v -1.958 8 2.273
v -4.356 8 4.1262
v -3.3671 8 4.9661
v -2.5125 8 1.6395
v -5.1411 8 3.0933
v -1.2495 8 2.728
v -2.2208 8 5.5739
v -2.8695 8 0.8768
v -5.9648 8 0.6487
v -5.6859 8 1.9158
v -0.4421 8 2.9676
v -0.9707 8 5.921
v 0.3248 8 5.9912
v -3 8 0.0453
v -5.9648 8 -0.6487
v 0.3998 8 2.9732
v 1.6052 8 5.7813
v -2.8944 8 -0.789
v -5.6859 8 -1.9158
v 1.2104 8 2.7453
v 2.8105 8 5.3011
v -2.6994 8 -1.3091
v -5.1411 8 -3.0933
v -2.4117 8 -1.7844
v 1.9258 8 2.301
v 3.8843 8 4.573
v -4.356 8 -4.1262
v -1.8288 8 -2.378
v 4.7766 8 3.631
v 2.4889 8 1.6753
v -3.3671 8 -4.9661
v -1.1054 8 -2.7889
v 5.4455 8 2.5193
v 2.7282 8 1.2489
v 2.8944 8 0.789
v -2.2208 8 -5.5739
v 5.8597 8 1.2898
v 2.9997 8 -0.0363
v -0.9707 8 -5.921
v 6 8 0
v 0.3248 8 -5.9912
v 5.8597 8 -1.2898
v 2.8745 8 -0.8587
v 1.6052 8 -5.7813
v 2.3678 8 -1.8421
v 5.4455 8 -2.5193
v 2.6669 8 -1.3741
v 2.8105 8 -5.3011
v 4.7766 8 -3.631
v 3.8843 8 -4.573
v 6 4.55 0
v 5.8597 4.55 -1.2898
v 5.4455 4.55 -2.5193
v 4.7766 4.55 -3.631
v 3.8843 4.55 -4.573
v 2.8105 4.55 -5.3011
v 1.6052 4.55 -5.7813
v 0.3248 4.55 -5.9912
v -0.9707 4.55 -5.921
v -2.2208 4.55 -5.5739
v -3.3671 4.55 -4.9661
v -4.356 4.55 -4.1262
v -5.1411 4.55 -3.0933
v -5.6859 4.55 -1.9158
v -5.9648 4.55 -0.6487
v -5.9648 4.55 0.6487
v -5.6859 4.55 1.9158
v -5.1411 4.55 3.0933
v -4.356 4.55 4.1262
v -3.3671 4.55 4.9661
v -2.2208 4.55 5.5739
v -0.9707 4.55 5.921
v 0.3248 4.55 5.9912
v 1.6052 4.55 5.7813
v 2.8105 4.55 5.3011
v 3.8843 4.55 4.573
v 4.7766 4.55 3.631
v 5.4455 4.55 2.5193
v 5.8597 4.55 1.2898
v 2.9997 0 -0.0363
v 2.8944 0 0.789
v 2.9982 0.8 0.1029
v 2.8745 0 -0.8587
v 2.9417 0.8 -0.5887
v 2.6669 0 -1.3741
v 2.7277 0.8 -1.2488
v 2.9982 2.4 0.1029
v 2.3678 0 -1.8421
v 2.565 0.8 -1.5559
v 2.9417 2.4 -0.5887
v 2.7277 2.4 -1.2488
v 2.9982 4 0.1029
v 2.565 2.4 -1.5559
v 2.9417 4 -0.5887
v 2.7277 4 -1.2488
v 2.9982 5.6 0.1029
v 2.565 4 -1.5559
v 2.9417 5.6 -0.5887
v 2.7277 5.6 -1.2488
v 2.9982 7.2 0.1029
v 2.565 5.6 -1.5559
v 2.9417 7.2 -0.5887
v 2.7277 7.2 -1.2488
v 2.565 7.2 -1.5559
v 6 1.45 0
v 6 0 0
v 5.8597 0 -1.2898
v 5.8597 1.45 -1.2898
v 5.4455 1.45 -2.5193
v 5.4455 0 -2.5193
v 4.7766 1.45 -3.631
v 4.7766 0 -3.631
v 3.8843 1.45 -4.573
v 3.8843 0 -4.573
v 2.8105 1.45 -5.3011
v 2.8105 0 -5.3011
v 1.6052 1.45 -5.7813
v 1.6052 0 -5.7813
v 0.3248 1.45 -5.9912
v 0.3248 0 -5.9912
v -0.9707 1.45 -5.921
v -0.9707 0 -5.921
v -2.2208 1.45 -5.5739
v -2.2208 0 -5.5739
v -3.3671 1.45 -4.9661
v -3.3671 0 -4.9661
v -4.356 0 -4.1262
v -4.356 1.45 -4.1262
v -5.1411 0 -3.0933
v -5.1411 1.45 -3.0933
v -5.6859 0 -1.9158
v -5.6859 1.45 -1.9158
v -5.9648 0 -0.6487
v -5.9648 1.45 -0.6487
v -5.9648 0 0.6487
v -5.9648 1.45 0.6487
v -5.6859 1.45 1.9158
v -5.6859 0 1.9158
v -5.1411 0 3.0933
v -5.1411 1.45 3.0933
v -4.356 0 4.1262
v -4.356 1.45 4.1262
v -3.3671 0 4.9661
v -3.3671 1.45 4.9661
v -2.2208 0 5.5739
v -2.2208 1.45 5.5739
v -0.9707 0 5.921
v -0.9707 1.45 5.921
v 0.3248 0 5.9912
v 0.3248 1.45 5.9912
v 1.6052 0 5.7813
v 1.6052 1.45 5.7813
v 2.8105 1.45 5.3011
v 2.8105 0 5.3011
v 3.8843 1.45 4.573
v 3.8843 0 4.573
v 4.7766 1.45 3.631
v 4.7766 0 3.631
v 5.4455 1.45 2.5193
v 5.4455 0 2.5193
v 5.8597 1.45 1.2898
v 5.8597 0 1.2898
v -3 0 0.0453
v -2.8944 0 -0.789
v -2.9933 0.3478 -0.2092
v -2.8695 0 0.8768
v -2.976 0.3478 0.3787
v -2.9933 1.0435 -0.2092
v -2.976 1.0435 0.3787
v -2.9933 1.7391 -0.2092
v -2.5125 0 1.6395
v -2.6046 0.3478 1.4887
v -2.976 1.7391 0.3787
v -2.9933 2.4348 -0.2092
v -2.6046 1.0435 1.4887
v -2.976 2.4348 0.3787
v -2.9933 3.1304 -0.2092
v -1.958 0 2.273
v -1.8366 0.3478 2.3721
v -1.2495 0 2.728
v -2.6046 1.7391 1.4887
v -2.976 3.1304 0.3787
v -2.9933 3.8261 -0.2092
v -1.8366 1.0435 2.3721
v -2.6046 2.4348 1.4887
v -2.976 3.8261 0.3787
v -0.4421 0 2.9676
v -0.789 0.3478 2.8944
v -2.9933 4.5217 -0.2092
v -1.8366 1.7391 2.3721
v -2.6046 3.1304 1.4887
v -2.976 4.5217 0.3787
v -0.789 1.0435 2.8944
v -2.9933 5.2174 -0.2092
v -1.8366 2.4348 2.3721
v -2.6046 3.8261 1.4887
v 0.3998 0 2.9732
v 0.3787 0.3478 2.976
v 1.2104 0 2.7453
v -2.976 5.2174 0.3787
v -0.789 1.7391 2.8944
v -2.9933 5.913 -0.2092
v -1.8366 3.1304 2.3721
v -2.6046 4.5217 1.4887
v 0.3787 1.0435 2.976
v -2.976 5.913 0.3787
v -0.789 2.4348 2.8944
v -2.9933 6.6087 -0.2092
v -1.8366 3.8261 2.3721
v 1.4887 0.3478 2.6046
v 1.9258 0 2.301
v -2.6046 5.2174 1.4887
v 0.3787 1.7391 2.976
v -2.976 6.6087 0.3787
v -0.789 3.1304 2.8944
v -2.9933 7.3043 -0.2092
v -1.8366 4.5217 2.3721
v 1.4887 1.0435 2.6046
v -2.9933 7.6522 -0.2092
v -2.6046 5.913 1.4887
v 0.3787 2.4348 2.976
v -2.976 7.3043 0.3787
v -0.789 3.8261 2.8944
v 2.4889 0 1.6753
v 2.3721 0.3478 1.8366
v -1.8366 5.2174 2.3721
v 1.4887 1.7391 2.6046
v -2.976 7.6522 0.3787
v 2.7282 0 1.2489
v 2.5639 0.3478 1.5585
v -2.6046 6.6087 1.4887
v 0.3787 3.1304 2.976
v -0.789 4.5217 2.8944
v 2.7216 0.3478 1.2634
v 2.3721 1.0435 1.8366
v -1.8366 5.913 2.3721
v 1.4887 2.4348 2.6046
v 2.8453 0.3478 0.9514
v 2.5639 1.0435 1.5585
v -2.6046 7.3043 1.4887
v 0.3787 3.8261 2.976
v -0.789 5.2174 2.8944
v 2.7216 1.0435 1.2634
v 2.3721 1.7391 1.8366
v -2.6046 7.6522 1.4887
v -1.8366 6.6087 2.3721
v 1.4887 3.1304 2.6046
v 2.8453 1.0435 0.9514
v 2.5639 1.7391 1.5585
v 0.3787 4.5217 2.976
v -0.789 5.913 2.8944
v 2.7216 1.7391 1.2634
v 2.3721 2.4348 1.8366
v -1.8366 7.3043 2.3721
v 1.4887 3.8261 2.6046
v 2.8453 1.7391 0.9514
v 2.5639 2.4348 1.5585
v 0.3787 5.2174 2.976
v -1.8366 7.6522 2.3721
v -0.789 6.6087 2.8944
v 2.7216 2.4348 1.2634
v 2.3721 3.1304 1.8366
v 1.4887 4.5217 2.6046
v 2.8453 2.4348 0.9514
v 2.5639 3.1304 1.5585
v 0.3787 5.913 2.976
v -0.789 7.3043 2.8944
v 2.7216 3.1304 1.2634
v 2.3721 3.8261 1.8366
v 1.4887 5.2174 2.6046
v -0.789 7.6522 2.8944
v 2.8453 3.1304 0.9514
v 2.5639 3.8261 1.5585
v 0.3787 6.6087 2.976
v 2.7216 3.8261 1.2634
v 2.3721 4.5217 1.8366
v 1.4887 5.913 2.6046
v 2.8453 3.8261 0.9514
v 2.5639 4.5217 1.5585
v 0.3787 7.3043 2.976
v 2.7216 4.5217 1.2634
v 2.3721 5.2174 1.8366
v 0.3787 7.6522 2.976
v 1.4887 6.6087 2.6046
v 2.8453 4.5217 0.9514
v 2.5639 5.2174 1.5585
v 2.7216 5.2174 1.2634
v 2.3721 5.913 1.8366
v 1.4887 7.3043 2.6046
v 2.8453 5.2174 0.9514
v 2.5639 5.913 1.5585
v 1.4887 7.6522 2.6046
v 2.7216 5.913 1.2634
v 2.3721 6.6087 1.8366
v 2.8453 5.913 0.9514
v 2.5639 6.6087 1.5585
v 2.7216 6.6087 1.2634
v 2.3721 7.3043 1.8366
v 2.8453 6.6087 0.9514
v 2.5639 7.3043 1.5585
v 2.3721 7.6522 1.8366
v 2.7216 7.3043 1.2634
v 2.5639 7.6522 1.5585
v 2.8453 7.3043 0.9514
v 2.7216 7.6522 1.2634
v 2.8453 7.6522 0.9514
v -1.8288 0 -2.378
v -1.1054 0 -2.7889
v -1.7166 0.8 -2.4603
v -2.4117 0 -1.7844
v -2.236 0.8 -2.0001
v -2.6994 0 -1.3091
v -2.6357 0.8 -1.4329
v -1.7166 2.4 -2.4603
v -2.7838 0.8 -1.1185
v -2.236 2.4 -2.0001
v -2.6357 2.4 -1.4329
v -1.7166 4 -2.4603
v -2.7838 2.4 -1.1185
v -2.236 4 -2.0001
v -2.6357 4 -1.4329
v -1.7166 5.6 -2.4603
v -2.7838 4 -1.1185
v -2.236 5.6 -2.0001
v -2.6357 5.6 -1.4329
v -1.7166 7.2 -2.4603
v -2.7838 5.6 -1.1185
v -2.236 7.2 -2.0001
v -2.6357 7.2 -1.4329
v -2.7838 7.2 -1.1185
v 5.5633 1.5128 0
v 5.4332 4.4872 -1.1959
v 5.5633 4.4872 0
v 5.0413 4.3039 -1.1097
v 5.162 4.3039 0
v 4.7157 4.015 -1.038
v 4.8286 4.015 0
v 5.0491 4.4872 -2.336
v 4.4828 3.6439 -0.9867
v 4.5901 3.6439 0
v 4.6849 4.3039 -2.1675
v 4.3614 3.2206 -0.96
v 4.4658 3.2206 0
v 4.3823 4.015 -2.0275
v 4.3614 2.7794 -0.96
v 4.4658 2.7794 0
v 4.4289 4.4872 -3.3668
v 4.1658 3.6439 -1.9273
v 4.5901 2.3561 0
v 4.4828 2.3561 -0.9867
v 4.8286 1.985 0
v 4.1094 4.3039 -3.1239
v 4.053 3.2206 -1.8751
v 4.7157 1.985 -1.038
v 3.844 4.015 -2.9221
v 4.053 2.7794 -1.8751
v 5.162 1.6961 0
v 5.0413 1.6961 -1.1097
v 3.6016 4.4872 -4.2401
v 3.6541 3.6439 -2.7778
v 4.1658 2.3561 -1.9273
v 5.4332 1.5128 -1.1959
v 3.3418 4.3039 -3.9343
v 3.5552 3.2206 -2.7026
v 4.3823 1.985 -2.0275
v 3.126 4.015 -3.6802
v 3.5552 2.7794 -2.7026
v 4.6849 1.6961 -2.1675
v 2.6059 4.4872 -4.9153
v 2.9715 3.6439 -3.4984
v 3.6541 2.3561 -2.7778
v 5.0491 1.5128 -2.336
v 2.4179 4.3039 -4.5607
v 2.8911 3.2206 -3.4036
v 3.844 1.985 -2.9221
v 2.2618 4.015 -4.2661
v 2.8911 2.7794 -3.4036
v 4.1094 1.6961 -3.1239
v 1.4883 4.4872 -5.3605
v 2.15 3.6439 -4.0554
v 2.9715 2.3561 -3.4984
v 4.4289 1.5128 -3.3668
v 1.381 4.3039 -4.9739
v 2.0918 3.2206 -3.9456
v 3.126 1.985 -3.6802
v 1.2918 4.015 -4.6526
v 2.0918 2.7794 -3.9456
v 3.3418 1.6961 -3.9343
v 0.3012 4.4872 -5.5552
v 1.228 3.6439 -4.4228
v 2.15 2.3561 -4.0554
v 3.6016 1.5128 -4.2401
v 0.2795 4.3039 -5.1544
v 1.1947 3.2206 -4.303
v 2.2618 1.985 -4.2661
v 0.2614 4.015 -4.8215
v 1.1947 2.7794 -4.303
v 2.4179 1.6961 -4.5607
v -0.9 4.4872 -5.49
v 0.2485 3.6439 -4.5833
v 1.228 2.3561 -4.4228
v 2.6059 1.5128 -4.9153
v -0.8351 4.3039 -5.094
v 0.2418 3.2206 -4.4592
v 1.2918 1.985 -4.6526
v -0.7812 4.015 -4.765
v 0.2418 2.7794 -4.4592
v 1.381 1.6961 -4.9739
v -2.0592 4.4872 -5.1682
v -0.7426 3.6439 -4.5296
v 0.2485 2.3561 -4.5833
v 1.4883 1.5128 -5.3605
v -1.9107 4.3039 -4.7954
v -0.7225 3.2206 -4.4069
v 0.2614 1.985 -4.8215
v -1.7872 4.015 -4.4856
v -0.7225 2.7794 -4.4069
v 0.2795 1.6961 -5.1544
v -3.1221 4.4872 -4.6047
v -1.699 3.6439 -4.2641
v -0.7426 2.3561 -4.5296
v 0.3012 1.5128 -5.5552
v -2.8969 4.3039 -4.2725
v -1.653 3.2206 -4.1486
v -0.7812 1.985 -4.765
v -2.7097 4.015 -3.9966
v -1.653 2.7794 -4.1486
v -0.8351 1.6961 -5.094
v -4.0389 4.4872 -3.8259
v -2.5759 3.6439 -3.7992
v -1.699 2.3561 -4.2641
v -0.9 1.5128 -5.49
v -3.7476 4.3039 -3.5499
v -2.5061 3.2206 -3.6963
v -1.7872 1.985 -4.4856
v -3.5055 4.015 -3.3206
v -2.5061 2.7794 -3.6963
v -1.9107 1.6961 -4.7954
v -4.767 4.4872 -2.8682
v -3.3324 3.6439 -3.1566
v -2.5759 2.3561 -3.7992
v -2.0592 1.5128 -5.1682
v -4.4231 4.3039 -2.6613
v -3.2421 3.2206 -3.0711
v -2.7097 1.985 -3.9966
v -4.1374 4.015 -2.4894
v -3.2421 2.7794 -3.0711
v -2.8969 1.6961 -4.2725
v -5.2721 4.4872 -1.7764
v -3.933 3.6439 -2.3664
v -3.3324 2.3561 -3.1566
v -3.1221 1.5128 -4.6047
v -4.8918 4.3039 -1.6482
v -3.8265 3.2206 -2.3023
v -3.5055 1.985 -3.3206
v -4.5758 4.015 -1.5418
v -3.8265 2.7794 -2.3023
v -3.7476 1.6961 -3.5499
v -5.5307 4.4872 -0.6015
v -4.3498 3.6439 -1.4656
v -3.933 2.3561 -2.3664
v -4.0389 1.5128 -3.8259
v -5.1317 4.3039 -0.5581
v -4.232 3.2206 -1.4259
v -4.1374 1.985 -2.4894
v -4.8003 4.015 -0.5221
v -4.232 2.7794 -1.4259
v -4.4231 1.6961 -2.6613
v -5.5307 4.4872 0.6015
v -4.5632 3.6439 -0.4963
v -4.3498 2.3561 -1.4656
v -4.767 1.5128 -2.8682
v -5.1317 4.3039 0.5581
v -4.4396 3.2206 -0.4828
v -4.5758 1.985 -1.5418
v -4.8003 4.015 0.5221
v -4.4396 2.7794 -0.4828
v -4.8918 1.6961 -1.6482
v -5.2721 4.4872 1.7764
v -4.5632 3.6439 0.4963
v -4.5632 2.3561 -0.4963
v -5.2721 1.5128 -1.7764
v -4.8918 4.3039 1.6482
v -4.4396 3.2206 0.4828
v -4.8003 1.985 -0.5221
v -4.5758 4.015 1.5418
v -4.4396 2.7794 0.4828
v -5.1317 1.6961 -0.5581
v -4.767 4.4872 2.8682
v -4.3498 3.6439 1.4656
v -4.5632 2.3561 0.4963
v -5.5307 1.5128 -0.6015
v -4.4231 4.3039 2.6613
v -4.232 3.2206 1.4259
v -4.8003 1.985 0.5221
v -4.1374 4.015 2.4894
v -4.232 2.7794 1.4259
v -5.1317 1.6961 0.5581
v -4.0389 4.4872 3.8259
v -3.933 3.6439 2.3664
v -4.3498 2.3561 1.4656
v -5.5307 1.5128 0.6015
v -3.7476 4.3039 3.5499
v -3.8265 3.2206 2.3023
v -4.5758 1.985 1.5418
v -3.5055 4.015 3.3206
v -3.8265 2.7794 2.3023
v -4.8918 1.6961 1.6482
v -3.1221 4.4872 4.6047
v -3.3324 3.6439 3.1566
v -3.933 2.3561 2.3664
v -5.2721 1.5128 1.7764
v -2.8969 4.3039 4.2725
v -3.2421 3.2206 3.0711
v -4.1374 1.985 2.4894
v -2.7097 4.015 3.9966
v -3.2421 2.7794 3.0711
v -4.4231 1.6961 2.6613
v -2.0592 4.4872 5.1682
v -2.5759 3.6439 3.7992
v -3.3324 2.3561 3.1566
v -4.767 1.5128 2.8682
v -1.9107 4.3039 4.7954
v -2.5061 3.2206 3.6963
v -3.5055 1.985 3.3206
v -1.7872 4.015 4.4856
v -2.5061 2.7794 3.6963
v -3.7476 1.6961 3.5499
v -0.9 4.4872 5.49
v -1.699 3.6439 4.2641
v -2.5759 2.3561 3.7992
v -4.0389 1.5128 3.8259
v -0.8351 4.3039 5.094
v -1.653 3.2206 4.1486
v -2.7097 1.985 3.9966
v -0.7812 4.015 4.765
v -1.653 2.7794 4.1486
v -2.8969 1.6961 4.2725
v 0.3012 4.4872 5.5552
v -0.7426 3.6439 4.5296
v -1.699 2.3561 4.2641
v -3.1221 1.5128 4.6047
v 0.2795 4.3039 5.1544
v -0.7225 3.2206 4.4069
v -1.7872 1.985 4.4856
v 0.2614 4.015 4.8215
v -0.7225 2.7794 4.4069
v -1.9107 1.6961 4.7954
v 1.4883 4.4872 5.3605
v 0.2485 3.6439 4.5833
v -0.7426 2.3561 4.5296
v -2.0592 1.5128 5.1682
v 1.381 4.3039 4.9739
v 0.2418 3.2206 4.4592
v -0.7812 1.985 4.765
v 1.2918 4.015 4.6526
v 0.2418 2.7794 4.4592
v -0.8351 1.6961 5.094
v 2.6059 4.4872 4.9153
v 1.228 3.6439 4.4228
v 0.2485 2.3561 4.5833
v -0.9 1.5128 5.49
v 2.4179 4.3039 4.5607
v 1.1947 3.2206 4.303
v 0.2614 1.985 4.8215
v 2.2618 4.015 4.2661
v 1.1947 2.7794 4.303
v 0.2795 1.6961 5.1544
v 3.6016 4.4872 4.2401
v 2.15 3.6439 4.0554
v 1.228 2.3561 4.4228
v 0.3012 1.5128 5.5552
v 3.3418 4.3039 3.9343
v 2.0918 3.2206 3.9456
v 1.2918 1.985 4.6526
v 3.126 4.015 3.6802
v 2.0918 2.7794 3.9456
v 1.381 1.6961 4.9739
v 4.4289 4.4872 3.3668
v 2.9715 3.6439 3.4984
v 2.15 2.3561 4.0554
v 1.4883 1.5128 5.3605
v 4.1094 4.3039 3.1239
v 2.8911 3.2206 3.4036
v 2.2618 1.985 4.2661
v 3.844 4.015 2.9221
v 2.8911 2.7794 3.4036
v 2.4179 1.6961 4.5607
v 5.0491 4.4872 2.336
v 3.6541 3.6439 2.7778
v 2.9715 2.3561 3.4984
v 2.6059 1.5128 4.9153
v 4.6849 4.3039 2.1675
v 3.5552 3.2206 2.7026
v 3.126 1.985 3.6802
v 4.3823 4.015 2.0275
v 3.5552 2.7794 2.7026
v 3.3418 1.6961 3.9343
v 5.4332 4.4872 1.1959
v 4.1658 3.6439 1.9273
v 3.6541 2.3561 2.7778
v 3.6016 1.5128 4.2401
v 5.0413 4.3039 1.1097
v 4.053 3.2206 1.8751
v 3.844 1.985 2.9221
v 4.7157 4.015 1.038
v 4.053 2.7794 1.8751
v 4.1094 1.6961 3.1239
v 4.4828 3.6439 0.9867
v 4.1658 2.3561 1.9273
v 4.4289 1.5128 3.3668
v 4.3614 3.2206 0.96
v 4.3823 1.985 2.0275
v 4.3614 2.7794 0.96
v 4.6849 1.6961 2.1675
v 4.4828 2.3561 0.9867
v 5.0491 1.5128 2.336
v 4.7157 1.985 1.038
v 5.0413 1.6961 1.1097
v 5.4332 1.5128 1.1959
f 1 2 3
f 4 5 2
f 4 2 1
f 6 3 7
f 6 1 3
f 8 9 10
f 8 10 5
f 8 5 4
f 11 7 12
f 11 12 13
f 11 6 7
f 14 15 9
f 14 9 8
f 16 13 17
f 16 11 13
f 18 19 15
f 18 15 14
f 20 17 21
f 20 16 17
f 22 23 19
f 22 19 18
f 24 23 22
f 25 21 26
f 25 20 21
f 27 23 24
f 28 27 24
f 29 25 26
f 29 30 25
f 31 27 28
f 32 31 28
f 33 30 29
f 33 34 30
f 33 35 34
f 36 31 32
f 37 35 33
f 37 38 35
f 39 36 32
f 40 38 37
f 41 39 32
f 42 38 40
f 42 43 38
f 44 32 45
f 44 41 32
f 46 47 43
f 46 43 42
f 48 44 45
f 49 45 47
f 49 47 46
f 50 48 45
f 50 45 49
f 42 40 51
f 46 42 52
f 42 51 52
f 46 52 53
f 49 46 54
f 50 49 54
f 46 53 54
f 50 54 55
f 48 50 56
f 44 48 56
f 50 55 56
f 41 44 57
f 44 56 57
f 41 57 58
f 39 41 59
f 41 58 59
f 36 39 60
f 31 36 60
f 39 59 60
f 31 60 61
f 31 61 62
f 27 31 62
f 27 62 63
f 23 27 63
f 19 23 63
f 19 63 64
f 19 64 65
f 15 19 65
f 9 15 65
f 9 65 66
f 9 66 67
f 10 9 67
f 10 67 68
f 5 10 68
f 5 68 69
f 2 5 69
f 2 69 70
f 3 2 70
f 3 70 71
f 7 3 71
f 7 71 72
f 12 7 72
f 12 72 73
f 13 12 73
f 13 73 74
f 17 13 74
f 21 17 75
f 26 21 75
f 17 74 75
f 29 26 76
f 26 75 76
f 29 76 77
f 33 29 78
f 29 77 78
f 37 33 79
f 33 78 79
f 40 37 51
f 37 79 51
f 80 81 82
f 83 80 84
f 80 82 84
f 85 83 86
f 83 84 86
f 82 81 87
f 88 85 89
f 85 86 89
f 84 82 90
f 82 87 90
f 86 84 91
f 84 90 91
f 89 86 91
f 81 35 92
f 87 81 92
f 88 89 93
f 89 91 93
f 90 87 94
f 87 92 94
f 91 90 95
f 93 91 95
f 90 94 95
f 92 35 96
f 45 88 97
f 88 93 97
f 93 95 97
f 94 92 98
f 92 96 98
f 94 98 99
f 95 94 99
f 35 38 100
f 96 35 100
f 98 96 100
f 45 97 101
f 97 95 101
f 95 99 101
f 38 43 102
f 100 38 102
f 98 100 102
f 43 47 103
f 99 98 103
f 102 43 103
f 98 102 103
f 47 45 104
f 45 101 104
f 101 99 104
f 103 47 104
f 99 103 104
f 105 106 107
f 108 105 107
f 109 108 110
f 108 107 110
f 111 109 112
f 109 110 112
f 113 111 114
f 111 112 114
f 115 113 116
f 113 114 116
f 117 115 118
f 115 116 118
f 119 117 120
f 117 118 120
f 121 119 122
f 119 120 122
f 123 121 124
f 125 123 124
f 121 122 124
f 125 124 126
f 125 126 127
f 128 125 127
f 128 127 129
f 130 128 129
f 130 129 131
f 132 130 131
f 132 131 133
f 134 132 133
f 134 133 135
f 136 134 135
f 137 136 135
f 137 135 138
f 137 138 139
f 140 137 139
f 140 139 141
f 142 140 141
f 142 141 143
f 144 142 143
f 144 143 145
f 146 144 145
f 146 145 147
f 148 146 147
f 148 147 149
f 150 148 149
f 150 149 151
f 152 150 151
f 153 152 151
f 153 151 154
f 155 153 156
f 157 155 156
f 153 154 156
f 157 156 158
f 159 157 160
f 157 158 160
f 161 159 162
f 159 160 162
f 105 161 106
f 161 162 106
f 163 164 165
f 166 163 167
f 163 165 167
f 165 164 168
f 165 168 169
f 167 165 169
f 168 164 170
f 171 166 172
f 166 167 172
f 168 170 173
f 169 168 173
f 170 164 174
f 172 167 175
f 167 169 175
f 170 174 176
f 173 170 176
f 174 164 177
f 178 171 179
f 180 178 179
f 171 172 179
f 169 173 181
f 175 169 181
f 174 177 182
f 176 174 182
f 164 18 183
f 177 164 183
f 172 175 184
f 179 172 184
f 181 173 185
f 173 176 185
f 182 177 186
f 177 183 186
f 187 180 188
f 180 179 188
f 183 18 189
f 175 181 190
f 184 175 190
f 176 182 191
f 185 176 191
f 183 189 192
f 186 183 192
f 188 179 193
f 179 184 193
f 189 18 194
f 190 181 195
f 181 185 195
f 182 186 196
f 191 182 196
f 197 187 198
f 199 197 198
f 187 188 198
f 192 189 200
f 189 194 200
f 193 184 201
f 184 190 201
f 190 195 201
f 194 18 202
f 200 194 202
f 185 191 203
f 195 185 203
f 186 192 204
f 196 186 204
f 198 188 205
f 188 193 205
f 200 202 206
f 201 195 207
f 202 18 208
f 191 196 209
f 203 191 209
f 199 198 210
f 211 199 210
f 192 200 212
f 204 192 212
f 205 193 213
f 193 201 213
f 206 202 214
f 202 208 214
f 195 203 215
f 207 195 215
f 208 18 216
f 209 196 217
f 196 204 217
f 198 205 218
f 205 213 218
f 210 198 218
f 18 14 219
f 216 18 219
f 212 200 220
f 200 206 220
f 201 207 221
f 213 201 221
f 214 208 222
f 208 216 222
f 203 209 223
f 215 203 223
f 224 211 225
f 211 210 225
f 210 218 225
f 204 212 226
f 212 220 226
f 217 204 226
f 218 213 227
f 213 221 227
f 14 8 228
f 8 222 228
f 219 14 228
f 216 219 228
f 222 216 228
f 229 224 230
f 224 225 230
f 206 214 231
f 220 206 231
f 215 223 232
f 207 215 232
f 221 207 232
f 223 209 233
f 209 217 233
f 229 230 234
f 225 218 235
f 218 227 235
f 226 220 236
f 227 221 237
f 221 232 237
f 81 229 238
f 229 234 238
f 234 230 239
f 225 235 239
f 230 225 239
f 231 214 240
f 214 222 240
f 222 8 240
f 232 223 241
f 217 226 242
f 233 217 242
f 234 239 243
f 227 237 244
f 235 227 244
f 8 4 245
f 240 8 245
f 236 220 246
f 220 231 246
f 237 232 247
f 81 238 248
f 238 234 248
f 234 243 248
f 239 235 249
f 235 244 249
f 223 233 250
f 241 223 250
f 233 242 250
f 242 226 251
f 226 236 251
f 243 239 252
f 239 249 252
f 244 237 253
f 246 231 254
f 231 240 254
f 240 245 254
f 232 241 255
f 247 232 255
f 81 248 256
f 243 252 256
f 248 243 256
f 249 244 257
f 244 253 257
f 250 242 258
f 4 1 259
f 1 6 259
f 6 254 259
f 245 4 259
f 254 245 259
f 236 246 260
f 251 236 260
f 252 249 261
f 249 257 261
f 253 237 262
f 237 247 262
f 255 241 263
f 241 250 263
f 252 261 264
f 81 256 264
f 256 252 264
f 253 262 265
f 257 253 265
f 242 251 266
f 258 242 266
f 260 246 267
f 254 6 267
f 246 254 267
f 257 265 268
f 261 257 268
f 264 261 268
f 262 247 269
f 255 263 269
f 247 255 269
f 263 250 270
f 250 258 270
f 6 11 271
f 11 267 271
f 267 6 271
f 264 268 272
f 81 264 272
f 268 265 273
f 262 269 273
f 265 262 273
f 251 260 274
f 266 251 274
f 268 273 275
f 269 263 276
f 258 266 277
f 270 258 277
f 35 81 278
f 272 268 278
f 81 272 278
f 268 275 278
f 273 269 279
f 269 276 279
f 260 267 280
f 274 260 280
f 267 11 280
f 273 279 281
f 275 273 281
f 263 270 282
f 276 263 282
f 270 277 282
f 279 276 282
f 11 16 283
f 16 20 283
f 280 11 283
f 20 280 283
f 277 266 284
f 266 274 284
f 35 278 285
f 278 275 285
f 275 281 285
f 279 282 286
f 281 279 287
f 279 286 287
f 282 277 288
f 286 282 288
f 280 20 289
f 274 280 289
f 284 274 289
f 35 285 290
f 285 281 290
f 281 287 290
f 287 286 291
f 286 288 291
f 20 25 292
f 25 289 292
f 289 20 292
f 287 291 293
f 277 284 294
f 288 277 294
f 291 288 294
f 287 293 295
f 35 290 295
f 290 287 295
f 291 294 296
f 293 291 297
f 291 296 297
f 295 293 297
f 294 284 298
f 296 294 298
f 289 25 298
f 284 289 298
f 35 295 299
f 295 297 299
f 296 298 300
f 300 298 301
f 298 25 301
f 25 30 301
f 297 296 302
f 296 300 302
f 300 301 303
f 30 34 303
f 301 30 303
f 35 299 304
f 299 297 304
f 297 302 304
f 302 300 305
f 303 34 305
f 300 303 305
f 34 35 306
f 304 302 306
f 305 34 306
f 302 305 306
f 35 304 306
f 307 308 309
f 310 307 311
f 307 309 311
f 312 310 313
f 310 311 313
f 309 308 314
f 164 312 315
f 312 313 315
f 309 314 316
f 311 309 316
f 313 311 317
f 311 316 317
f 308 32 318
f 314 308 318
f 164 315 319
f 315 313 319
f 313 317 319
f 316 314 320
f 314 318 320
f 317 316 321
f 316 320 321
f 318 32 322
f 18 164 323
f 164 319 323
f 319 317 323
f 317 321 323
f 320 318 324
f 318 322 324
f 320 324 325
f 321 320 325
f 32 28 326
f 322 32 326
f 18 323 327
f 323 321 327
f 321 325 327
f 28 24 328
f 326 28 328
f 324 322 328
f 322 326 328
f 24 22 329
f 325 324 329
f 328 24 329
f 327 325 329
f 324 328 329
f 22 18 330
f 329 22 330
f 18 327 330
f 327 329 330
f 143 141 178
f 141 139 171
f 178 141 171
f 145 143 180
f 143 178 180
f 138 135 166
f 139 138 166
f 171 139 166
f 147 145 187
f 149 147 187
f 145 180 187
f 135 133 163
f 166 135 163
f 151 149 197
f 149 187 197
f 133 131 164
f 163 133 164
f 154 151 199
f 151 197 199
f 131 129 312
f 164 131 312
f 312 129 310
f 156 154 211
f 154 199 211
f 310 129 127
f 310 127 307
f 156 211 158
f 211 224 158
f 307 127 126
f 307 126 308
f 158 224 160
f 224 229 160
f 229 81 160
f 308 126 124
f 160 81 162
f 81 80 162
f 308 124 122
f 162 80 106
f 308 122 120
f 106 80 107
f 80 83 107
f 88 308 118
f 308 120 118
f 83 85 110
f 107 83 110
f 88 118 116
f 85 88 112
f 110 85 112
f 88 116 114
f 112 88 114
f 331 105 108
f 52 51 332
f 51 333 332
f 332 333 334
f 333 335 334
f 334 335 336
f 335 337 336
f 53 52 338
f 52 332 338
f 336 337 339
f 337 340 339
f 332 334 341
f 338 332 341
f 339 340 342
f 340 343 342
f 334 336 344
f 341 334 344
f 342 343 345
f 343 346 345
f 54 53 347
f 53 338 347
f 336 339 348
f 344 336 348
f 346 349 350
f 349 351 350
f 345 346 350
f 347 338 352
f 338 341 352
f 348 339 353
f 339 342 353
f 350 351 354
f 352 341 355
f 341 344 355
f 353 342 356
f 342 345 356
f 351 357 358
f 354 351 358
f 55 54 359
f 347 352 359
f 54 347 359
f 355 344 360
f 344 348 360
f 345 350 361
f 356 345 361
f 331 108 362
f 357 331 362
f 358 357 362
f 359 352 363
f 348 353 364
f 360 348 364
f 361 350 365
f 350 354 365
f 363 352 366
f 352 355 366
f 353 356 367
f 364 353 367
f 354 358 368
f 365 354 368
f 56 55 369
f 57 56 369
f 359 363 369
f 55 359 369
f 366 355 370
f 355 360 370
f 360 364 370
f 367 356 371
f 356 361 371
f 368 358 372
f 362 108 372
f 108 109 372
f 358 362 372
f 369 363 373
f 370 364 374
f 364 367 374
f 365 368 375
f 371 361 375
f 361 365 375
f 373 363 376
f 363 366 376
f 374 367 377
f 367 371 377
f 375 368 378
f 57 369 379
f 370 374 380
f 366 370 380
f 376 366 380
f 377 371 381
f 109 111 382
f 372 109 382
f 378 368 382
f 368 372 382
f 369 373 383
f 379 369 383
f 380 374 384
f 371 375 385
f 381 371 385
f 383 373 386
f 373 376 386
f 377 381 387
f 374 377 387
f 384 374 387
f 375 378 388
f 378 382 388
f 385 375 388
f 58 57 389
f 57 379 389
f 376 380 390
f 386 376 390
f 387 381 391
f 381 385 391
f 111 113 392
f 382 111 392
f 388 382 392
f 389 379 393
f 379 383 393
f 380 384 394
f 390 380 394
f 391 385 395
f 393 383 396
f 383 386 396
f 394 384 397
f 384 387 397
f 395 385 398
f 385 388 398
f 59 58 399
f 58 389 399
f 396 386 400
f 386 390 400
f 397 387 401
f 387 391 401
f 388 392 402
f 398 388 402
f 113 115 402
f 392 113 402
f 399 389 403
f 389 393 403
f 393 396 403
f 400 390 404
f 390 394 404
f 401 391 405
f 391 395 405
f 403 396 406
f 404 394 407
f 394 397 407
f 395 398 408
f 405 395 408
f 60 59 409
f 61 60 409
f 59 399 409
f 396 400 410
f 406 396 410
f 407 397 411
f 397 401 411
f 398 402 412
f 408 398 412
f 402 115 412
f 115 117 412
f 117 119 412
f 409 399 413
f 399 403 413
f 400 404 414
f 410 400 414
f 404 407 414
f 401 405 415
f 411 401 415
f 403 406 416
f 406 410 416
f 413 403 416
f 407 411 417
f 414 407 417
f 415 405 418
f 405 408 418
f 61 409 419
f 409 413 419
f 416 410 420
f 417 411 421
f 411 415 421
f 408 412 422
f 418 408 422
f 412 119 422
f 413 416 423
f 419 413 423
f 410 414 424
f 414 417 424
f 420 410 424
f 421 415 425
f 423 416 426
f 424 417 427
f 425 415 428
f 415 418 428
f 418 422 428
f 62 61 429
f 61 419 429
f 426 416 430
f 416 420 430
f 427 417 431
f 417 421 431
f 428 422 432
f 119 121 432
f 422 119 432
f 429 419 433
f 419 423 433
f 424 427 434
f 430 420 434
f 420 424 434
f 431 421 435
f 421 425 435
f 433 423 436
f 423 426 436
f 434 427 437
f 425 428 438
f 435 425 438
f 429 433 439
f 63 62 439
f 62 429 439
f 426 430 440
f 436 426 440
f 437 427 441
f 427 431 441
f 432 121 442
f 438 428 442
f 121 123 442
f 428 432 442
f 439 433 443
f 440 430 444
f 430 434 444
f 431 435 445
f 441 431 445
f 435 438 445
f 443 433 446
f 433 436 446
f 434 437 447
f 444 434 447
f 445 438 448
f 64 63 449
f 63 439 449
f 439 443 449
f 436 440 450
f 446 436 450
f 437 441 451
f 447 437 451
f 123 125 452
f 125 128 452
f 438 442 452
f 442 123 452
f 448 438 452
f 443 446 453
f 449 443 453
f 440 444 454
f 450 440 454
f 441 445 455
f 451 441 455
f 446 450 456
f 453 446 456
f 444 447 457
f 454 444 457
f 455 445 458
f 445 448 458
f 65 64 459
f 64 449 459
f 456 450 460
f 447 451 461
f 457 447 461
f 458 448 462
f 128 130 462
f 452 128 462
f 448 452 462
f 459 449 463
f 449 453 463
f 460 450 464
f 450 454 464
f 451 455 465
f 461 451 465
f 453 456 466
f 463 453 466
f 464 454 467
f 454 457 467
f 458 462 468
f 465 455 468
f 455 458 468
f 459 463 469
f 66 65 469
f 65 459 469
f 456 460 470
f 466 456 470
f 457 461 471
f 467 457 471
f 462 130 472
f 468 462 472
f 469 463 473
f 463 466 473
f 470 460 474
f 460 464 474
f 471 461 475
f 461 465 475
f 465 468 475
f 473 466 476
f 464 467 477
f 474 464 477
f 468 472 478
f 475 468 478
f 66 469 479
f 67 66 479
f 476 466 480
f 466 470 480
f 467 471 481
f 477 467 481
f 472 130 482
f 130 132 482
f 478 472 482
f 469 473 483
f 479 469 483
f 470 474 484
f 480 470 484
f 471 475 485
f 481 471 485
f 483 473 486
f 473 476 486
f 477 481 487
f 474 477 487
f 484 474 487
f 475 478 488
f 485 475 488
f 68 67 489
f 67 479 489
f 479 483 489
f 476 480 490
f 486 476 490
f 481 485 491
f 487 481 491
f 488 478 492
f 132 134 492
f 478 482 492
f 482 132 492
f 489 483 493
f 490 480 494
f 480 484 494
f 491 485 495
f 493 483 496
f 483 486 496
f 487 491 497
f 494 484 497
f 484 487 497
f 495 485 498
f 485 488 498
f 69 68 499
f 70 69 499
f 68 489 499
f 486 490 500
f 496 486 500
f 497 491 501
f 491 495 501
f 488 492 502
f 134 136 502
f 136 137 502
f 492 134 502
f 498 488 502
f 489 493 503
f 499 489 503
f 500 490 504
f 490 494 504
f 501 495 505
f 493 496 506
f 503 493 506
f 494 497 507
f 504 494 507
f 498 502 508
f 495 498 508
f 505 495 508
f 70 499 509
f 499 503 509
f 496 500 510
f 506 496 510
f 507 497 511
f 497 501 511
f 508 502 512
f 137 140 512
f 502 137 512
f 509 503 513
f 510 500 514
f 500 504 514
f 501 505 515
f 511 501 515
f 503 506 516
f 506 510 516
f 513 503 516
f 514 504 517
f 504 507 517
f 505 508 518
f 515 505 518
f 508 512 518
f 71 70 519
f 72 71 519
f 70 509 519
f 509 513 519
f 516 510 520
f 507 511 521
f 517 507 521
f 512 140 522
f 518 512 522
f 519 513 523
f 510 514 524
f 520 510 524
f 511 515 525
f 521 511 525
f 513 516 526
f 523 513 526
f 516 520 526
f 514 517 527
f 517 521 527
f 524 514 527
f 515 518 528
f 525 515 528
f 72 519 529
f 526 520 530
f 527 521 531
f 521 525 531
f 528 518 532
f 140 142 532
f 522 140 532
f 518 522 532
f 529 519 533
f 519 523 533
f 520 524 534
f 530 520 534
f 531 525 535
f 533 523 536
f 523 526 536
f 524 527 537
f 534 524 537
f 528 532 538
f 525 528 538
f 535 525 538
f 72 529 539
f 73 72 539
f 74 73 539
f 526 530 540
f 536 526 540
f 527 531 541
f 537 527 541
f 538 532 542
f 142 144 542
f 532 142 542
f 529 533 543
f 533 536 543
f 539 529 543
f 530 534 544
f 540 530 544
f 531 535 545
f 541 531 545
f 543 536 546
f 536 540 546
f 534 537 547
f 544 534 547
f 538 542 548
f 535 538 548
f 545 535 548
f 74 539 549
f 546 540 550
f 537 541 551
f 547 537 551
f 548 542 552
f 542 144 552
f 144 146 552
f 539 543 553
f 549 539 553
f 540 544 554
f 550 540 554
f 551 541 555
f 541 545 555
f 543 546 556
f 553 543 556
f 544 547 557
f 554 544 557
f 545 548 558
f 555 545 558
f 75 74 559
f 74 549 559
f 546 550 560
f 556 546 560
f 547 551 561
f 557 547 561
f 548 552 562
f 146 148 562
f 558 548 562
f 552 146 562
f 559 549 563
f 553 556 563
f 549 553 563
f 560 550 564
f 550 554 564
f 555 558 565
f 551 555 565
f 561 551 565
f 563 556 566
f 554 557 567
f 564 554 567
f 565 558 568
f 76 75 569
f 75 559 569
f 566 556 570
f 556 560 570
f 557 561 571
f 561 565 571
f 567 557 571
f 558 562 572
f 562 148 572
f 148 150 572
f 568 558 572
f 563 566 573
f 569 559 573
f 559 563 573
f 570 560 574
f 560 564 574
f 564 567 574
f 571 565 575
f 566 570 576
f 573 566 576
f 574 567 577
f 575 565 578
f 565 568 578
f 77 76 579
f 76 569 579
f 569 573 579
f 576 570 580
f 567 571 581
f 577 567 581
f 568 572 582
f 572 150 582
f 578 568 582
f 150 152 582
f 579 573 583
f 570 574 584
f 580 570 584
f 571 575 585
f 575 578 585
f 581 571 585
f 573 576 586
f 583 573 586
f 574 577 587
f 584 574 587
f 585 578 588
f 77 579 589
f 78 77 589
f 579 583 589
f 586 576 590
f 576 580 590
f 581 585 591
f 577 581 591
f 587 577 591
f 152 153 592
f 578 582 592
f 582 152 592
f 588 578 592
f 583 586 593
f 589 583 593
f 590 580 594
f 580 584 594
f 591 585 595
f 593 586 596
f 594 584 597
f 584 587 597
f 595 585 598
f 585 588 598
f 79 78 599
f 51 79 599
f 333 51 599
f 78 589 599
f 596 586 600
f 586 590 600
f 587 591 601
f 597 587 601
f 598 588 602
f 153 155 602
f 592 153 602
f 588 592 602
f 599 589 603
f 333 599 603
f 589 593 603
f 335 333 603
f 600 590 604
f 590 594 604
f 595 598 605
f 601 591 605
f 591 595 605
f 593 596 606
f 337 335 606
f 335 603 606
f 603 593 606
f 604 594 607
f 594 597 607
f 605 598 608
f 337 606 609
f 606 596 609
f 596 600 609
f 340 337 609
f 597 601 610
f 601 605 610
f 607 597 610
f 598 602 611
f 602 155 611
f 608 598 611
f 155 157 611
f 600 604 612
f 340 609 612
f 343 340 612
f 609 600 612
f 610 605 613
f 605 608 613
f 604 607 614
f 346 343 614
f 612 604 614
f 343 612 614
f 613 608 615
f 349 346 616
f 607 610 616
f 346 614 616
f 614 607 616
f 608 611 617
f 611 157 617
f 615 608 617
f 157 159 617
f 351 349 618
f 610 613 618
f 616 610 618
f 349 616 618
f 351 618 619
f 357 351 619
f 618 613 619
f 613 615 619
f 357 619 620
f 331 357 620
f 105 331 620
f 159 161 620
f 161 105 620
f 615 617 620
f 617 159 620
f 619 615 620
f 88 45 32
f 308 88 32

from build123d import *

# Parameters (mm, degrees)
SKETCH1_R           = 6
BOSS_EXTRUDE1_DEPTH = 8
SKETCH2_R           = 1.55
CUT_EXTRUDE1_DEPTH  = 8


with BuildPart() as part:
    # Sketch1 → Boss-Extrude1 (new body)
    with BuildSketch(Plane(origin=(0, 0, 0), x_dir=(1, 0, 0), z_dir=(0, 1, 0))):
        Circle(SKETCH1_R)
    extrude(amount=BOSS_EXTRUDE1_DEPTH)

    # Sketch2 → Cut-Revolve1 (revolve, cut)
    with BuildSketch(Plane.XY):
        with Locations((6, 3)):
            Circle(SKETCH2_R)
    revolve(axis=Axis((0, 0, 0), (0, 1, 0)), mode=Mode.SUBTRACT)

    # Sketch4 → Cut-Extrude1 (cut)
    with BuildSketch(Plane(origin=(0, 8, 0), x_dir=(1, 0, 0), z_dir=(0, 1, 0))):
        with BuildLine():
            Line((2.367842107, 1.842094434), (-1.105416324, 2.788918537))
            add(Edge.make_bspline(
                [(-1.105416324, 2.788918537), (-1.211764888, 2.742631763), (-1.424454479, 2.650061493), (-1.720250186, 2.465348), (-1.994235491, 2.250550124), (-2.240915768, 2.004518267), (-2.457887126, 1.732083649), (-2.610986563, 1.48525109), (-2.715877402, 1.278481127), (-2.78522539, 1.119080225), (-2.845851316, 0.956099515), (-2.87818707, 0.844775171), (-2.894381942, 0.789020063)],
                knots=[0, 0, 0, 0, 0.124991315, 0.249973772, 0.374969516, 0.499947485, 0.624943228, 0.749921197, 0.812549698, 0.874965023, 0.93737813, 1, 1, 1, 1], degree=3))
            add(Edge.make_bspline(
                [(-2.894381942, 0.789020063), (-2.91771894, 0.693111264), (-2.96416552, 0.502228293), (-2.997819256, 0.209481258), (-3.004051012, -0.084817673), (-2.972979949, -0.476455315), (-2.864367877, -0.958570493), (-2.620857625, -1.498032442), (-2.279511198, -1.981666548), (-1.848081992, -2.386982606), (-1.347643479, -2.703146387), (-0.793946169, -2.912516199), (-0.21061126, -3.013102534), (0.381062278, -2.994642374), (0.958480559, -2.864348225), (1.498072184, -2.620836257), (1.981597519, -2.279616329), (2.29100443, -1.950138678), (2.473270872, -1.700917619), (2.56507701, -1.55952933), (2.648325999, -1.413887775), (2.723092545, -1.264002096), (2.789155439, -1.109821709), (2.84731552, -0.951568689), (2.878651893, -0.84334537), (2.894381942, -0.789020063)],
                knots=[0, 0, 0, 0, 0.031431158, 0.06255602, 0.093680213, 0.125109383, 0.187591007, 0.250067296, 0.312548923, 0.37502521, 0.437506837, 0.499983124, 0.562464749, 0.624941037, 0.687422663, 0.749898951, 0.812380576, 0.874856864, 0.892877316, 0.910755613, 0.928547986, 0.946311478, 0.964103414, 0.981980842, 1, 1, 1, 1], degree=3))
            add(Edge.make_bspline(
                [(2.894381942, -0.789020063), (2.921161696, -0.676169025), (2.974719306, -0.450474947), (3.004425987, -0.103009906), (2.996978881, 0.245057447), (2.94816153, 0.590021165), (2.860396577, 0.9270594), (2.754790092, 1.197638787), (2.652308524, 1.405613669), (2.566396509, 1.55673277), (2.472387401, 1.703022102), (2.402729306, 1.795685419), (2.367842107, 1.842094434)],
                knots=[0, 0, 0, 0, 0.124991314, 0.249973772, 0.374969515, 0.499947485, 0.624943228, 0.749921198, 0.812549697, 0.874965022, 0.937378129, 1, 1, 1, 1], degree=3))
        make_face()
    extrude(amount=-CUT_EXTRUDE1_DEPTH, mode=Mode.SUBTRACT)


solid = part.part
